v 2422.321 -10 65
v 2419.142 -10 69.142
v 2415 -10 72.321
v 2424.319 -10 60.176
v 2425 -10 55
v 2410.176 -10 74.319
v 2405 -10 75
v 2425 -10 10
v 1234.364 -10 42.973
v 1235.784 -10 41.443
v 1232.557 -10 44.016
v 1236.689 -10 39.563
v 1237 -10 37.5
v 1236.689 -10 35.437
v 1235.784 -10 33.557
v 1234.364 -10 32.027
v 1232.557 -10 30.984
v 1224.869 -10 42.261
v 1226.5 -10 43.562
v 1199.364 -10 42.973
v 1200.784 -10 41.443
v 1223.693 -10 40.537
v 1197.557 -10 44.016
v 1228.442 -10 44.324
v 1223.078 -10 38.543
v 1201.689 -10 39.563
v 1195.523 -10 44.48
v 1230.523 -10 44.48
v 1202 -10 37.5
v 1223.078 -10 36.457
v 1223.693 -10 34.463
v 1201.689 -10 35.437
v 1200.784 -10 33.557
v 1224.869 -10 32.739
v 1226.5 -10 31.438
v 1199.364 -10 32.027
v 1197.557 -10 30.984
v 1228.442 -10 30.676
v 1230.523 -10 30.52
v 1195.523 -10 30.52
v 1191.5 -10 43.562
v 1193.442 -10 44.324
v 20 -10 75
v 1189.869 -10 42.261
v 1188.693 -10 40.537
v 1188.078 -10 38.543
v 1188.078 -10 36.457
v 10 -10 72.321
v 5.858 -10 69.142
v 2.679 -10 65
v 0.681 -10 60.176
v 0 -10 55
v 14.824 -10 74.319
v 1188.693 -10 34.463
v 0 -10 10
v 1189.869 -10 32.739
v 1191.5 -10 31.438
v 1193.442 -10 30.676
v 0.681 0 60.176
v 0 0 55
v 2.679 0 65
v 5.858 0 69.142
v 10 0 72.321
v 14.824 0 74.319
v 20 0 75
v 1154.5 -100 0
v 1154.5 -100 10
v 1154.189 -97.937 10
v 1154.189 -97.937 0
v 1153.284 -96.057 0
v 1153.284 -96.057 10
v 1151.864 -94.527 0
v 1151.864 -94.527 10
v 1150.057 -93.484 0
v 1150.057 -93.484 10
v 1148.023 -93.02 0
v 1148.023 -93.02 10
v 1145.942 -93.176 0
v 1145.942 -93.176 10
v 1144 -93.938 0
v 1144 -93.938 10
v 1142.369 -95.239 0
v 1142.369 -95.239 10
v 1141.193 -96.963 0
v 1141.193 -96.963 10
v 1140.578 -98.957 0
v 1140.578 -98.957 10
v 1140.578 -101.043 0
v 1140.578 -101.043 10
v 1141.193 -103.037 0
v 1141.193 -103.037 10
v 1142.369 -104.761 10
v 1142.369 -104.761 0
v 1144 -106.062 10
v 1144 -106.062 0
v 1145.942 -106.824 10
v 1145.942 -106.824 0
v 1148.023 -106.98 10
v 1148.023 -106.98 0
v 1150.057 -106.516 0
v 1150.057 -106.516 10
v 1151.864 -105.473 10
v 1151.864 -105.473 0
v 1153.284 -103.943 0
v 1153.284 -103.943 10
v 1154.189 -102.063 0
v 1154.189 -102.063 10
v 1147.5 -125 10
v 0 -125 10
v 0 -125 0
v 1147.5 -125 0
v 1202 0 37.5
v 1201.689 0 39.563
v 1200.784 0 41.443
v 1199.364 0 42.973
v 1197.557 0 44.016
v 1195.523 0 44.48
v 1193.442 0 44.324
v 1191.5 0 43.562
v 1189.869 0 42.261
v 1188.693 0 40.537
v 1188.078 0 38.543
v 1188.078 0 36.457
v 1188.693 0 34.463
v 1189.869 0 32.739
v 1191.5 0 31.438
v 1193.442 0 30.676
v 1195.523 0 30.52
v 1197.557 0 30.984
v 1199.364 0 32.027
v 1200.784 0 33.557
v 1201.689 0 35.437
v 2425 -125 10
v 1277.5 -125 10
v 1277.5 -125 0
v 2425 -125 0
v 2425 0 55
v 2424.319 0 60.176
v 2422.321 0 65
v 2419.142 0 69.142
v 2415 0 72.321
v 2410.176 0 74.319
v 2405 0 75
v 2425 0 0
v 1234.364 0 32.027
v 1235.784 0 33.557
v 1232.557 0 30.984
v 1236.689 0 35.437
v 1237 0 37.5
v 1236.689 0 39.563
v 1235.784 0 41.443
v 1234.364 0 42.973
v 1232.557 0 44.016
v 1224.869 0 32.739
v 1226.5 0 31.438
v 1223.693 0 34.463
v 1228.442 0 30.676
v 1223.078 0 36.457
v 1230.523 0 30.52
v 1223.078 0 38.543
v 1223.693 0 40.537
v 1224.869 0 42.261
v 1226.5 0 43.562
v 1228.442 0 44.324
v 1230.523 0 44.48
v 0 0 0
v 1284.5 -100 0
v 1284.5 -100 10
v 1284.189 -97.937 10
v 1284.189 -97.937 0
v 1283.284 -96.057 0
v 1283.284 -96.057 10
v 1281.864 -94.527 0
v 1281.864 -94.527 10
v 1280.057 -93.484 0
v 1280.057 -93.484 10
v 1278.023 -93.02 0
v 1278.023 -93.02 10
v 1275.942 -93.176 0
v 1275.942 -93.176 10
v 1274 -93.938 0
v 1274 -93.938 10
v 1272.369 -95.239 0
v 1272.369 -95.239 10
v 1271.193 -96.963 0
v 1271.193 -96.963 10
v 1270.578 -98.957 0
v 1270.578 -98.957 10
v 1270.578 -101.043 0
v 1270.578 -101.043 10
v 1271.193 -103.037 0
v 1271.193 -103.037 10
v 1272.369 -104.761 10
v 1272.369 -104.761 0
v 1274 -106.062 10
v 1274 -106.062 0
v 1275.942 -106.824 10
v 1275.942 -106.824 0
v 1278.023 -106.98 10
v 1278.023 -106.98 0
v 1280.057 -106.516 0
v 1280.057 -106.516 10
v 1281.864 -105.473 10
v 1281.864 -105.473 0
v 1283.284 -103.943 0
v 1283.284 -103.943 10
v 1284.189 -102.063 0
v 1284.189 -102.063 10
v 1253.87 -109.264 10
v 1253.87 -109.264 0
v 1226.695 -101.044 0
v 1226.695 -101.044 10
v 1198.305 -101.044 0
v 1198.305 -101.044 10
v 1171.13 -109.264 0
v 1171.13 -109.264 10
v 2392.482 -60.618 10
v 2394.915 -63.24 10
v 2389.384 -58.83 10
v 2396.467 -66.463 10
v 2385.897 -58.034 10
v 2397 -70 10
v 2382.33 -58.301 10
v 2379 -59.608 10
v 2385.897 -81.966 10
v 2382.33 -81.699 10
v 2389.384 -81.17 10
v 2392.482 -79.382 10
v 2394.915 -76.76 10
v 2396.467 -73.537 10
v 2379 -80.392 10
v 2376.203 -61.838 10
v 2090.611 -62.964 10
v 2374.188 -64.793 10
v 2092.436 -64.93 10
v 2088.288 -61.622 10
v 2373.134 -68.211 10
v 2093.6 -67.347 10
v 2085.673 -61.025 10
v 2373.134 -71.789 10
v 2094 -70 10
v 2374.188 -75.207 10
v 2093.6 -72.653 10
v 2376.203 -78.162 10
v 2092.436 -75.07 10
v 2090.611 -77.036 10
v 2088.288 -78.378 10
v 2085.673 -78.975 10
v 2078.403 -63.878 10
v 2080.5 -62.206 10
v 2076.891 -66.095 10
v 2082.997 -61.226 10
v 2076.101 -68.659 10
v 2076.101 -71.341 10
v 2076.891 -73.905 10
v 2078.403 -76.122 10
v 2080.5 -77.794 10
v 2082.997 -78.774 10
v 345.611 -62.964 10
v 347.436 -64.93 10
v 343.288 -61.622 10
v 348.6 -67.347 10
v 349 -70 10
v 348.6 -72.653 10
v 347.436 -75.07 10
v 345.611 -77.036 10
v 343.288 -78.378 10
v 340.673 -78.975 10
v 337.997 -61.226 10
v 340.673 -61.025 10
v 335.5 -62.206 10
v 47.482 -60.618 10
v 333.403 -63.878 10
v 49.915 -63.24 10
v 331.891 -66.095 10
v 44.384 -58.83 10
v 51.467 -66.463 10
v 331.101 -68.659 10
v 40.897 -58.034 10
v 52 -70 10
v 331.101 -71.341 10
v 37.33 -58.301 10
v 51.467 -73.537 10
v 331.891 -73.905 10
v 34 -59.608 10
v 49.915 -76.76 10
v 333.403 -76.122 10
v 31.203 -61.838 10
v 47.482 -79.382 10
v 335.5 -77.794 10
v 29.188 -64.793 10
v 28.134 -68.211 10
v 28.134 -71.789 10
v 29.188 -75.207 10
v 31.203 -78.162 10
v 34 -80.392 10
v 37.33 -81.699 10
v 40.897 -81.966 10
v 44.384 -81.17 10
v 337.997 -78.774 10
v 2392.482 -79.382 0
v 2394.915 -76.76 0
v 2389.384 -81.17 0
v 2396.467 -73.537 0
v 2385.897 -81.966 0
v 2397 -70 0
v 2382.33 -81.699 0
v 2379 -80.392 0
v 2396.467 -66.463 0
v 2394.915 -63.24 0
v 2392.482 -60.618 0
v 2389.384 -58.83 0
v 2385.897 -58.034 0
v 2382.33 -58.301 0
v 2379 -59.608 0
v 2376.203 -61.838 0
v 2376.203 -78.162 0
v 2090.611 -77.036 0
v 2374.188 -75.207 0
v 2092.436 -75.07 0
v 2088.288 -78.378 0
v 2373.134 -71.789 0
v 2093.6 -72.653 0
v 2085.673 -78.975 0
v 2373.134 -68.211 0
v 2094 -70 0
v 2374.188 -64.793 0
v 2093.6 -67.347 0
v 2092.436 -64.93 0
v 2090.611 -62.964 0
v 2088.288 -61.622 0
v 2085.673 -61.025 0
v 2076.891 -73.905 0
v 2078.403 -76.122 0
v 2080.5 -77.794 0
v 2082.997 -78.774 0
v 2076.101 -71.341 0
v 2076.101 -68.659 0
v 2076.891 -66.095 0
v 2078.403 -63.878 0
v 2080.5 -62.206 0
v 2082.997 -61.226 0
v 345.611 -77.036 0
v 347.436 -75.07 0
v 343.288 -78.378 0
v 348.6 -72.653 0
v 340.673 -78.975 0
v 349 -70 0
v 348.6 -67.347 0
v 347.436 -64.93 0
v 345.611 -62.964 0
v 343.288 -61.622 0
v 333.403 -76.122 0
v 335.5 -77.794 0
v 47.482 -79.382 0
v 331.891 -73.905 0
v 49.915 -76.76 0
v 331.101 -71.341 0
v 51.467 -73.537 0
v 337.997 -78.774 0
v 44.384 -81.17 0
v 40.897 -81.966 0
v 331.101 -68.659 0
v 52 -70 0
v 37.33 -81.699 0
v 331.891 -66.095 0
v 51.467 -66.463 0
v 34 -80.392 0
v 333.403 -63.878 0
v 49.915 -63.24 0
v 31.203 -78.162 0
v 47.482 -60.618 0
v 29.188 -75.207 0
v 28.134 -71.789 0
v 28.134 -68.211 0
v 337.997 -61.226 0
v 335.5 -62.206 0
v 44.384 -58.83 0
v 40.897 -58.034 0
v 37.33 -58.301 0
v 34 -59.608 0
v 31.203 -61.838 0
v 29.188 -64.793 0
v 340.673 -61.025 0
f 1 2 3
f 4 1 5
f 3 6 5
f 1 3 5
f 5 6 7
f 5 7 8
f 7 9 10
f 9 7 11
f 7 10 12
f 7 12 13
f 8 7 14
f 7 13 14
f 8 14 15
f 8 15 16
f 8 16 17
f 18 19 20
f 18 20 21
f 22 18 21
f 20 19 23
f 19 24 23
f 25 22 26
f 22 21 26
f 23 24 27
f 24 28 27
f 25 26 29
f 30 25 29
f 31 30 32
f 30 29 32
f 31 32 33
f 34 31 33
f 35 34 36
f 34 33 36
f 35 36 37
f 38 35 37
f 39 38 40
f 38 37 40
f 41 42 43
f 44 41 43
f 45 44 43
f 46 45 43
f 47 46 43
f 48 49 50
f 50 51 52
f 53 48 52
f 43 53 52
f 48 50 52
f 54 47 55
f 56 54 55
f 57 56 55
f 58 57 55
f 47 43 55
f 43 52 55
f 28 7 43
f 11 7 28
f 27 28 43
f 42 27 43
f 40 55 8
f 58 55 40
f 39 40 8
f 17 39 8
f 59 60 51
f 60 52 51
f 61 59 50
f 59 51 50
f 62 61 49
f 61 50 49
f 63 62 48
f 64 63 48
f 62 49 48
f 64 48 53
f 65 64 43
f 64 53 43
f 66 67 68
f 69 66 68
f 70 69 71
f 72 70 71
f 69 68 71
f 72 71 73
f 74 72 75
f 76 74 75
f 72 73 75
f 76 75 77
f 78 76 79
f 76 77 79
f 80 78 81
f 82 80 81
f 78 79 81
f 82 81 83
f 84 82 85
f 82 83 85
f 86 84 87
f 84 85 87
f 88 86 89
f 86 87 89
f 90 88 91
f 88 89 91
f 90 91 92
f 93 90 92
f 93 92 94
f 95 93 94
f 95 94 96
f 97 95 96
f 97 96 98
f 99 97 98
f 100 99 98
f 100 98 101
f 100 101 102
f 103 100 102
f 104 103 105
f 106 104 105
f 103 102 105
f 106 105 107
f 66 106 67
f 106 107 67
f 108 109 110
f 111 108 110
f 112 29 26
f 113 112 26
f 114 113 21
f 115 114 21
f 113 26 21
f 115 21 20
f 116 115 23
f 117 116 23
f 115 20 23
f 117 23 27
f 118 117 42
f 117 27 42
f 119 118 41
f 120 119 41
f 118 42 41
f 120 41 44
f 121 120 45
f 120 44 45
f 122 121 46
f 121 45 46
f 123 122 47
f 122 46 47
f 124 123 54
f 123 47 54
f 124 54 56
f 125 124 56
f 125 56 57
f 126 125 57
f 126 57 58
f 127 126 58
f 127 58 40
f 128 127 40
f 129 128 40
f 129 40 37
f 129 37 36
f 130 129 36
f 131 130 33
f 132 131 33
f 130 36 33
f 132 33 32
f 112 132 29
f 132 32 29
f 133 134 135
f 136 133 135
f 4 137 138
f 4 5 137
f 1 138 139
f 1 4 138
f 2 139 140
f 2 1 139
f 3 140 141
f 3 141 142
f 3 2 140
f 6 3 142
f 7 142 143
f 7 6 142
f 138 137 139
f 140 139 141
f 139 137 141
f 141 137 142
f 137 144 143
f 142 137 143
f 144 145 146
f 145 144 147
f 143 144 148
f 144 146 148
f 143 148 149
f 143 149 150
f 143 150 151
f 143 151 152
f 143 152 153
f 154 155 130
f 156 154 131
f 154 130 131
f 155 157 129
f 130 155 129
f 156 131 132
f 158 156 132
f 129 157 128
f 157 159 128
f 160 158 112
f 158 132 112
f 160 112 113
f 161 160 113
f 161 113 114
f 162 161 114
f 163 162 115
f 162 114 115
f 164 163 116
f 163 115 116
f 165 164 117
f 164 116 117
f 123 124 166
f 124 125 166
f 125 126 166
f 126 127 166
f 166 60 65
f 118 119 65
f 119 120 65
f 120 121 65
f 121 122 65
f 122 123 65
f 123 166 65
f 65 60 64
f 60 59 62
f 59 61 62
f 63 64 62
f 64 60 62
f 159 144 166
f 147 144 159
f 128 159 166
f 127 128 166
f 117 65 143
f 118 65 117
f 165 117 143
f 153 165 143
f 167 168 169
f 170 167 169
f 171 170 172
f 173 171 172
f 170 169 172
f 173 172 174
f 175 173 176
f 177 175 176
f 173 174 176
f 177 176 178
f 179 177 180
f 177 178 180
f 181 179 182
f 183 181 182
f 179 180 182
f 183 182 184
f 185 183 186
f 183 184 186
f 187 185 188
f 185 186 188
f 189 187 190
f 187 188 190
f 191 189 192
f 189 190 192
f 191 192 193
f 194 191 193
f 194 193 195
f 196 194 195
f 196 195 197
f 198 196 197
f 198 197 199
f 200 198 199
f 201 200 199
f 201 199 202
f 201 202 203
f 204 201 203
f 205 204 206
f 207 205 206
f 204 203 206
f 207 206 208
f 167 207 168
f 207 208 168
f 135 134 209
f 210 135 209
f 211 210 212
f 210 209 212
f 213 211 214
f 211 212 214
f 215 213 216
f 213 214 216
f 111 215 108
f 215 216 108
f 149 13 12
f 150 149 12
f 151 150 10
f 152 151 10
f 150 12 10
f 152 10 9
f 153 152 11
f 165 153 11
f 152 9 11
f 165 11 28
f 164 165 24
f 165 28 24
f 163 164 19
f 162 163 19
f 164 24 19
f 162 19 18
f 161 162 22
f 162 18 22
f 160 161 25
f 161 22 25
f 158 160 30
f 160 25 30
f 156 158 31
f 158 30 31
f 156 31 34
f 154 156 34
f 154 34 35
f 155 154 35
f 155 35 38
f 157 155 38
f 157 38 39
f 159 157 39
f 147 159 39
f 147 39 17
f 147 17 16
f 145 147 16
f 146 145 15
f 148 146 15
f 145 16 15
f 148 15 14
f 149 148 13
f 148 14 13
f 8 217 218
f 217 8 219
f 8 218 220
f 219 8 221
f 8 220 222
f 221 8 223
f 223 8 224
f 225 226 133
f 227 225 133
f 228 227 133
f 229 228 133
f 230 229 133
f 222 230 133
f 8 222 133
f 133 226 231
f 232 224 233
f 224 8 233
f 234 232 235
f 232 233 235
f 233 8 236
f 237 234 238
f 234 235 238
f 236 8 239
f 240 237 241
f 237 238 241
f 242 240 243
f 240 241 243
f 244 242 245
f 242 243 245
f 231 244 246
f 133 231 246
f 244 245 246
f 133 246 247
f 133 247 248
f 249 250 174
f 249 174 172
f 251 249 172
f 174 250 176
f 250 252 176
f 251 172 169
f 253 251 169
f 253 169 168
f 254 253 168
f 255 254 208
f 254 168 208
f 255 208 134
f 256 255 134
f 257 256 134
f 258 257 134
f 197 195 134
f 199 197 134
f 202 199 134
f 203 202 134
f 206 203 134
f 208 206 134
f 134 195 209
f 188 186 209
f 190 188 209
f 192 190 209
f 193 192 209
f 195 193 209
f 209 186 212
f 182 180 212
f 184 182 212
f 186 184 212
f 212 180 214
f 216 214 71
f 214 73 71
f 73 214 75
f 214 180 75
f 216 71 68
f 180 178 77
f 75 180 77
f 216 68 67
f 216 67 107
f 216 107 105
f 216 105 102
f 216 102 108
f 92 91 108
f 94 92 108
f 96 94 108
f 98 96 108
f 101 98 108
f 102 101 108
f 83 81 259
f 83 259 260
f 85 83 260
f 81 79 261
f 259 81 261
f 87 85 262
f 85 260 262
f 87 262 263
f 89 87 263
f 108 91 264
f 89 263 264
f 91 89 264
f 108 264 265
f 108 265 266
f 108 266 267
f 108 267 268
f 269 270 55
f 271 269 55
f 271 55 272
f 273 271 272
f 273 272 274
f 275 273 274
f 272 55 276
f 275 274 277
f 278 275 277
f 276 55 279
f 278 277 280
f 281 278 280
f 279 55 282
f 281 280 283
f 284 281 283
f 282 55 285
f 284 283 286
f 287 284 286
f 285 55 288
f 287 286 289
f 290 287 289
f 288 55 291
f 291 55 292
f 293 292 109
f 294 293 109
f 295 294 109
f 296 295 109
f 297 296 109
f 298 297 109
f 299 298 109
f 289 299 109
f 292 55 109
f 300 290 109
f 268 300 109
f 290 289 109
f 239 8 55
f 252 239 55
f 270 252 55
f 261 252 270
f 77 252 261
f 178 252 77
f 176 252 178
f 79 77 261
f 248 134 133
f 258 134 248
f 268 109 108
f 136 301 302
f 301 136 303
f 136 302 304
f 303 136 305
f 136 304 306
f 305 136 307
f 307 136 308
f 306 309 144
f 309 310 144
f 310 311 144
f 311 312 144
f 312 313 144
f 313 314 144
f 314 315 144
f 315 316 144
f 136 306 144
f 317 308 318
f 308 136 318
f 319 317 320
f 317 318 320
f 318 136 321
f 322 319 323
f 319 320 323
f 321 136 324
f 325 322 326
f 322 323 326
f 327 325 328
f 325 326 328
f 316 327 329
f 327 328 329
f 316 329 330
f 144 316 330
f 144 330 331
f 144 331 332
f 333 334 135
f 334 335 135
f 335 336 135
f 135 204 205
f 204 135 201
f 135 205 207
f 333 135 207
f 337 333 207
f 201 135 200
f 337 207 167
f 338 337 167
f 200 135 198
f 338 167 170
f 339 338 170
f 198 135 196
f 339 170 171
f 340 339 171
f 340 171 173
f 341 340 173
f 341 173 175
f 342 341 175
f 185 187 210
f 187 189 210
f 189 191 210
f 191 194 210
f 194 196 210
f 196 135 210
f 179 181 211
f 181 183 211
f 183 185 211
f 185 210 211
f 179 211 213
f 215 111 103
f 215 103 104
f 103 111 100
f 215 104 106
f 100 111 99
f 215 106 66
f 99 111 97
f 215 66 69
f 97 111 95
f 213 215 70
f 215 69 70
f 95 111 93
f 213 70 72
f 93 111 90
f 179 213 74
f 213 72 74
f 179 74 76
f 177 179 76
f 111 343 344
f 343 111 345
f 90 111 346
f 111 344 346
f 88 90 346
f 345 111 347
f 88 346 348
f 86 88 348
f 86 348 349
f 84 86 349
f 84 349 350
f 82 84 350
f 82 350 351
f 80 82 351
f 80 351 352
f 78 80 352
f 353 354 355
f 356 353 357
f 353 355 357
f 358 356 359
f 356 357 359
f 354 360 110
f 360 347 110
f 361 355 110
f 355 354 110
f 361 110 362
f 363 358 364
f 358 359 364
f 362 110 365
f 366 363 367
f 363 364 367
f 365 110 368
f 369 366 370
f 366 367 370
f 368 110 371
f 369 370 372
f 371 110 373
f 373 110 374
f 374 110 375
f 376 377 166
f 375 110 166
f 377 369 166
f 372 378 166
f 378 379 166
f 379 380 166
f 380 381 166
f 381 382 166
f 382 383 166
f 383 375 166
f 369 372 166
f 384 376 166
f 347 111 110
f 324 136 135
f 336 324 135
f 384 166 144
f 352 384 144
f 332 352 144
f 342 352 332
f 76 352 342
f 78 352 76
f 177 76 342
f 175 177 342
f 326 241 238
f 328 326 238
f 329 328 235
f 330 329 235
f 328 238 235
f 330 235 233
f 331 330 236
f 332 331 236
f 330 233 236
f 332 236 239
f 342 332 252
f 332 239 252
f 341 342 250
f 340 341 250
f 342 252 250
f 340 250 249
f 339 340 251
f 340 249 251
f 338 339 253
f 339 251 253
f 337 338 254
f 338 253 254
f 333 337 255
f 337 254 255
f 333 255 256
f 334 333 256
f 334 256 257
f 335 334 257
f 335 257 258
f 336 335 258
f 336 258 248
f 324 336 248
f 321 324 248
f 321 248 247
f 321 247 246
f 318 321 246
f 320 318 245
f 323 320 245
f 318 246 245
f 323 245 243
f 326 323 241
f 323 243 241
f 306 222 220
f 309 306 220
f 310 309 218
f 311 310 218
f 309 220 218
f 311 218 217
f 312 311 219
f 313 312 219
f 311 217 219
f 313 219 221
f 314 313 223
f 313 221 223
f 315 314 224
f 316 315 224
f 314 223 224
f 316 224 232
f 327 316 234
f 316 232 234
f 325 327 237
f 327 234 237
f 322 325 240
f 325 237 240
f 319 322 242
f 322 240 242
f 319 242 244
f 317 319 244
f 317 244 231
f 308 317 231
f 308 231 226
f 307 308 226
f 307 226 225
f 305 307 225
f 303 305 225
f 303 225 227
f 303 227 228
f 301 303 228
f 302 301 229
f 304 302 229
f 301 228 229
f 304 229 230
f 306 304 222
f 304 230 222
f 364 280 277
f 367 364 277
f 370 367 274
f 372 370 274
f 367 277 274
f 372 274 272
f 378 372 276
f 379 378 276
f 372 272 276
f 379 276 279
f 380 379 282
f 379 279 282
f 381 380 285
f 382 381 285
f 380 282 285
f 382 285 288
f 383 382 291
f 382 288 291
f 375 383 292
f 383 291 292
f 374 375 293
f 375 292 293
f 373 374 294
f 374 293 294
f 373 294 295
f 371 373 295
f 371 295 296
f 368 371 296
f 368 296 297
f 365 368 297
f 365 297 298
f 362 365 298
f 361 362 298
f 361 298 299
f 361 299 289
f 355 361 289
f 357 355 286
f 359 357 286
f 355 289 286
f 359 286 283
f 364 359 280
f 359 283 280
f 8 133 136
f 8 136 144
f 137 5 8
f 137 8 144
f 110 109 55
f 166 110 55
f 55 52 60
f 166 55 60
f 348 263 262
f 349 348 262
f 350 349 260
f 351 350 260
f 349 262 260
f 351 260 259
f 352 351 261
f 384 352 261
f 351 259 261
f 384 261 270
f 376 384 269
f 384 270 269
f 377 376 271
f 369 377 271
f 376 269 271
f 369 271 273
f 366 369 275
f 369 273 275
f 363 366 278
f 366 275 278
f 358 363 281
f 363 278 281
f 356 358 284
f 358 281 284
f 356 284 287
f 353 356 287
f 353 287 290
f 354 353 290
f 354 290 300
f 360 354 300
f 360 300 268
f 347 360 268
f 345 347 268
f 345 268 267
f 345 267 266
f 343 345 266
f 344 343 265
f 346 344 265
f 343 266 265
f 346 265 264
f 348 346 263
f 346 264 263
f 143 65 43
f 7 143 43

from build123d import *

# Parameters (mm, degrees)
F1_DEPTH = 2425
F2_R     = 12
F2_R_2   = 7
F2_R_3   = 9
F3_DEPTH = 10
F4_R     = 7
F5_DEPTH = 10
F6_R     = 20


with BuildPart() as f1:
    # F0 (on Right) → F1 (new body)
    with BuildSketch(Plane.YZ):
        Polygon((-125, 0), (0, 0), (0, 75), (-10, 75), (-10, 10), (-125, 10), align=None)
    extrude(amount=F1_DEPTH)

    # F2 (on face) → F3 (cut)
    with BuildSketch(Plane.XY.offset(10)):
        with Locations((40, -70)):
            Circle(F2_R)
        with Locations((2385, -70)):
            Circle(F2_R)
        with BuildLine():
            Line((1147.5, -125), (1277.5, -125))
            ThreePointArc((1277.5, -125), (1212.5, -100), (1147.5, -125))
        make_face()
        with Locations((1147.5, -100)):
            Circle(F2_R_2)
        with Locations((1277.5, -100)):
            Circle(F2_R_2)
        with Locations((2085, -70)):
            Circle(F2_R_3)
        with Locations((340, -70)):
            Circle(F2_R_3)
    extrude(amount=-F3_DEPTH, mode=Mode.SUBTRACT)

    # F4 (on face) → F5 (cut)
    with BuildSketch(Plane.XZ.offset(10)):
        with Locations((1195, 37.5)):
            Circle(F4_R)
        with Locations((1230, 37.5)):
            Circle(F4_R)
    extrude(amount=-F5_DEPTH, mode=Mode.SUBTRACT)

    # F6
    f6_edges = [f1.edges().sort_by_distance(p)[0] for p in [
        (2425, -5, 75),
        (0, -5, 75),
    ]]
    fillet(f6_edges, radius=F6_R)


solid = f1.part
